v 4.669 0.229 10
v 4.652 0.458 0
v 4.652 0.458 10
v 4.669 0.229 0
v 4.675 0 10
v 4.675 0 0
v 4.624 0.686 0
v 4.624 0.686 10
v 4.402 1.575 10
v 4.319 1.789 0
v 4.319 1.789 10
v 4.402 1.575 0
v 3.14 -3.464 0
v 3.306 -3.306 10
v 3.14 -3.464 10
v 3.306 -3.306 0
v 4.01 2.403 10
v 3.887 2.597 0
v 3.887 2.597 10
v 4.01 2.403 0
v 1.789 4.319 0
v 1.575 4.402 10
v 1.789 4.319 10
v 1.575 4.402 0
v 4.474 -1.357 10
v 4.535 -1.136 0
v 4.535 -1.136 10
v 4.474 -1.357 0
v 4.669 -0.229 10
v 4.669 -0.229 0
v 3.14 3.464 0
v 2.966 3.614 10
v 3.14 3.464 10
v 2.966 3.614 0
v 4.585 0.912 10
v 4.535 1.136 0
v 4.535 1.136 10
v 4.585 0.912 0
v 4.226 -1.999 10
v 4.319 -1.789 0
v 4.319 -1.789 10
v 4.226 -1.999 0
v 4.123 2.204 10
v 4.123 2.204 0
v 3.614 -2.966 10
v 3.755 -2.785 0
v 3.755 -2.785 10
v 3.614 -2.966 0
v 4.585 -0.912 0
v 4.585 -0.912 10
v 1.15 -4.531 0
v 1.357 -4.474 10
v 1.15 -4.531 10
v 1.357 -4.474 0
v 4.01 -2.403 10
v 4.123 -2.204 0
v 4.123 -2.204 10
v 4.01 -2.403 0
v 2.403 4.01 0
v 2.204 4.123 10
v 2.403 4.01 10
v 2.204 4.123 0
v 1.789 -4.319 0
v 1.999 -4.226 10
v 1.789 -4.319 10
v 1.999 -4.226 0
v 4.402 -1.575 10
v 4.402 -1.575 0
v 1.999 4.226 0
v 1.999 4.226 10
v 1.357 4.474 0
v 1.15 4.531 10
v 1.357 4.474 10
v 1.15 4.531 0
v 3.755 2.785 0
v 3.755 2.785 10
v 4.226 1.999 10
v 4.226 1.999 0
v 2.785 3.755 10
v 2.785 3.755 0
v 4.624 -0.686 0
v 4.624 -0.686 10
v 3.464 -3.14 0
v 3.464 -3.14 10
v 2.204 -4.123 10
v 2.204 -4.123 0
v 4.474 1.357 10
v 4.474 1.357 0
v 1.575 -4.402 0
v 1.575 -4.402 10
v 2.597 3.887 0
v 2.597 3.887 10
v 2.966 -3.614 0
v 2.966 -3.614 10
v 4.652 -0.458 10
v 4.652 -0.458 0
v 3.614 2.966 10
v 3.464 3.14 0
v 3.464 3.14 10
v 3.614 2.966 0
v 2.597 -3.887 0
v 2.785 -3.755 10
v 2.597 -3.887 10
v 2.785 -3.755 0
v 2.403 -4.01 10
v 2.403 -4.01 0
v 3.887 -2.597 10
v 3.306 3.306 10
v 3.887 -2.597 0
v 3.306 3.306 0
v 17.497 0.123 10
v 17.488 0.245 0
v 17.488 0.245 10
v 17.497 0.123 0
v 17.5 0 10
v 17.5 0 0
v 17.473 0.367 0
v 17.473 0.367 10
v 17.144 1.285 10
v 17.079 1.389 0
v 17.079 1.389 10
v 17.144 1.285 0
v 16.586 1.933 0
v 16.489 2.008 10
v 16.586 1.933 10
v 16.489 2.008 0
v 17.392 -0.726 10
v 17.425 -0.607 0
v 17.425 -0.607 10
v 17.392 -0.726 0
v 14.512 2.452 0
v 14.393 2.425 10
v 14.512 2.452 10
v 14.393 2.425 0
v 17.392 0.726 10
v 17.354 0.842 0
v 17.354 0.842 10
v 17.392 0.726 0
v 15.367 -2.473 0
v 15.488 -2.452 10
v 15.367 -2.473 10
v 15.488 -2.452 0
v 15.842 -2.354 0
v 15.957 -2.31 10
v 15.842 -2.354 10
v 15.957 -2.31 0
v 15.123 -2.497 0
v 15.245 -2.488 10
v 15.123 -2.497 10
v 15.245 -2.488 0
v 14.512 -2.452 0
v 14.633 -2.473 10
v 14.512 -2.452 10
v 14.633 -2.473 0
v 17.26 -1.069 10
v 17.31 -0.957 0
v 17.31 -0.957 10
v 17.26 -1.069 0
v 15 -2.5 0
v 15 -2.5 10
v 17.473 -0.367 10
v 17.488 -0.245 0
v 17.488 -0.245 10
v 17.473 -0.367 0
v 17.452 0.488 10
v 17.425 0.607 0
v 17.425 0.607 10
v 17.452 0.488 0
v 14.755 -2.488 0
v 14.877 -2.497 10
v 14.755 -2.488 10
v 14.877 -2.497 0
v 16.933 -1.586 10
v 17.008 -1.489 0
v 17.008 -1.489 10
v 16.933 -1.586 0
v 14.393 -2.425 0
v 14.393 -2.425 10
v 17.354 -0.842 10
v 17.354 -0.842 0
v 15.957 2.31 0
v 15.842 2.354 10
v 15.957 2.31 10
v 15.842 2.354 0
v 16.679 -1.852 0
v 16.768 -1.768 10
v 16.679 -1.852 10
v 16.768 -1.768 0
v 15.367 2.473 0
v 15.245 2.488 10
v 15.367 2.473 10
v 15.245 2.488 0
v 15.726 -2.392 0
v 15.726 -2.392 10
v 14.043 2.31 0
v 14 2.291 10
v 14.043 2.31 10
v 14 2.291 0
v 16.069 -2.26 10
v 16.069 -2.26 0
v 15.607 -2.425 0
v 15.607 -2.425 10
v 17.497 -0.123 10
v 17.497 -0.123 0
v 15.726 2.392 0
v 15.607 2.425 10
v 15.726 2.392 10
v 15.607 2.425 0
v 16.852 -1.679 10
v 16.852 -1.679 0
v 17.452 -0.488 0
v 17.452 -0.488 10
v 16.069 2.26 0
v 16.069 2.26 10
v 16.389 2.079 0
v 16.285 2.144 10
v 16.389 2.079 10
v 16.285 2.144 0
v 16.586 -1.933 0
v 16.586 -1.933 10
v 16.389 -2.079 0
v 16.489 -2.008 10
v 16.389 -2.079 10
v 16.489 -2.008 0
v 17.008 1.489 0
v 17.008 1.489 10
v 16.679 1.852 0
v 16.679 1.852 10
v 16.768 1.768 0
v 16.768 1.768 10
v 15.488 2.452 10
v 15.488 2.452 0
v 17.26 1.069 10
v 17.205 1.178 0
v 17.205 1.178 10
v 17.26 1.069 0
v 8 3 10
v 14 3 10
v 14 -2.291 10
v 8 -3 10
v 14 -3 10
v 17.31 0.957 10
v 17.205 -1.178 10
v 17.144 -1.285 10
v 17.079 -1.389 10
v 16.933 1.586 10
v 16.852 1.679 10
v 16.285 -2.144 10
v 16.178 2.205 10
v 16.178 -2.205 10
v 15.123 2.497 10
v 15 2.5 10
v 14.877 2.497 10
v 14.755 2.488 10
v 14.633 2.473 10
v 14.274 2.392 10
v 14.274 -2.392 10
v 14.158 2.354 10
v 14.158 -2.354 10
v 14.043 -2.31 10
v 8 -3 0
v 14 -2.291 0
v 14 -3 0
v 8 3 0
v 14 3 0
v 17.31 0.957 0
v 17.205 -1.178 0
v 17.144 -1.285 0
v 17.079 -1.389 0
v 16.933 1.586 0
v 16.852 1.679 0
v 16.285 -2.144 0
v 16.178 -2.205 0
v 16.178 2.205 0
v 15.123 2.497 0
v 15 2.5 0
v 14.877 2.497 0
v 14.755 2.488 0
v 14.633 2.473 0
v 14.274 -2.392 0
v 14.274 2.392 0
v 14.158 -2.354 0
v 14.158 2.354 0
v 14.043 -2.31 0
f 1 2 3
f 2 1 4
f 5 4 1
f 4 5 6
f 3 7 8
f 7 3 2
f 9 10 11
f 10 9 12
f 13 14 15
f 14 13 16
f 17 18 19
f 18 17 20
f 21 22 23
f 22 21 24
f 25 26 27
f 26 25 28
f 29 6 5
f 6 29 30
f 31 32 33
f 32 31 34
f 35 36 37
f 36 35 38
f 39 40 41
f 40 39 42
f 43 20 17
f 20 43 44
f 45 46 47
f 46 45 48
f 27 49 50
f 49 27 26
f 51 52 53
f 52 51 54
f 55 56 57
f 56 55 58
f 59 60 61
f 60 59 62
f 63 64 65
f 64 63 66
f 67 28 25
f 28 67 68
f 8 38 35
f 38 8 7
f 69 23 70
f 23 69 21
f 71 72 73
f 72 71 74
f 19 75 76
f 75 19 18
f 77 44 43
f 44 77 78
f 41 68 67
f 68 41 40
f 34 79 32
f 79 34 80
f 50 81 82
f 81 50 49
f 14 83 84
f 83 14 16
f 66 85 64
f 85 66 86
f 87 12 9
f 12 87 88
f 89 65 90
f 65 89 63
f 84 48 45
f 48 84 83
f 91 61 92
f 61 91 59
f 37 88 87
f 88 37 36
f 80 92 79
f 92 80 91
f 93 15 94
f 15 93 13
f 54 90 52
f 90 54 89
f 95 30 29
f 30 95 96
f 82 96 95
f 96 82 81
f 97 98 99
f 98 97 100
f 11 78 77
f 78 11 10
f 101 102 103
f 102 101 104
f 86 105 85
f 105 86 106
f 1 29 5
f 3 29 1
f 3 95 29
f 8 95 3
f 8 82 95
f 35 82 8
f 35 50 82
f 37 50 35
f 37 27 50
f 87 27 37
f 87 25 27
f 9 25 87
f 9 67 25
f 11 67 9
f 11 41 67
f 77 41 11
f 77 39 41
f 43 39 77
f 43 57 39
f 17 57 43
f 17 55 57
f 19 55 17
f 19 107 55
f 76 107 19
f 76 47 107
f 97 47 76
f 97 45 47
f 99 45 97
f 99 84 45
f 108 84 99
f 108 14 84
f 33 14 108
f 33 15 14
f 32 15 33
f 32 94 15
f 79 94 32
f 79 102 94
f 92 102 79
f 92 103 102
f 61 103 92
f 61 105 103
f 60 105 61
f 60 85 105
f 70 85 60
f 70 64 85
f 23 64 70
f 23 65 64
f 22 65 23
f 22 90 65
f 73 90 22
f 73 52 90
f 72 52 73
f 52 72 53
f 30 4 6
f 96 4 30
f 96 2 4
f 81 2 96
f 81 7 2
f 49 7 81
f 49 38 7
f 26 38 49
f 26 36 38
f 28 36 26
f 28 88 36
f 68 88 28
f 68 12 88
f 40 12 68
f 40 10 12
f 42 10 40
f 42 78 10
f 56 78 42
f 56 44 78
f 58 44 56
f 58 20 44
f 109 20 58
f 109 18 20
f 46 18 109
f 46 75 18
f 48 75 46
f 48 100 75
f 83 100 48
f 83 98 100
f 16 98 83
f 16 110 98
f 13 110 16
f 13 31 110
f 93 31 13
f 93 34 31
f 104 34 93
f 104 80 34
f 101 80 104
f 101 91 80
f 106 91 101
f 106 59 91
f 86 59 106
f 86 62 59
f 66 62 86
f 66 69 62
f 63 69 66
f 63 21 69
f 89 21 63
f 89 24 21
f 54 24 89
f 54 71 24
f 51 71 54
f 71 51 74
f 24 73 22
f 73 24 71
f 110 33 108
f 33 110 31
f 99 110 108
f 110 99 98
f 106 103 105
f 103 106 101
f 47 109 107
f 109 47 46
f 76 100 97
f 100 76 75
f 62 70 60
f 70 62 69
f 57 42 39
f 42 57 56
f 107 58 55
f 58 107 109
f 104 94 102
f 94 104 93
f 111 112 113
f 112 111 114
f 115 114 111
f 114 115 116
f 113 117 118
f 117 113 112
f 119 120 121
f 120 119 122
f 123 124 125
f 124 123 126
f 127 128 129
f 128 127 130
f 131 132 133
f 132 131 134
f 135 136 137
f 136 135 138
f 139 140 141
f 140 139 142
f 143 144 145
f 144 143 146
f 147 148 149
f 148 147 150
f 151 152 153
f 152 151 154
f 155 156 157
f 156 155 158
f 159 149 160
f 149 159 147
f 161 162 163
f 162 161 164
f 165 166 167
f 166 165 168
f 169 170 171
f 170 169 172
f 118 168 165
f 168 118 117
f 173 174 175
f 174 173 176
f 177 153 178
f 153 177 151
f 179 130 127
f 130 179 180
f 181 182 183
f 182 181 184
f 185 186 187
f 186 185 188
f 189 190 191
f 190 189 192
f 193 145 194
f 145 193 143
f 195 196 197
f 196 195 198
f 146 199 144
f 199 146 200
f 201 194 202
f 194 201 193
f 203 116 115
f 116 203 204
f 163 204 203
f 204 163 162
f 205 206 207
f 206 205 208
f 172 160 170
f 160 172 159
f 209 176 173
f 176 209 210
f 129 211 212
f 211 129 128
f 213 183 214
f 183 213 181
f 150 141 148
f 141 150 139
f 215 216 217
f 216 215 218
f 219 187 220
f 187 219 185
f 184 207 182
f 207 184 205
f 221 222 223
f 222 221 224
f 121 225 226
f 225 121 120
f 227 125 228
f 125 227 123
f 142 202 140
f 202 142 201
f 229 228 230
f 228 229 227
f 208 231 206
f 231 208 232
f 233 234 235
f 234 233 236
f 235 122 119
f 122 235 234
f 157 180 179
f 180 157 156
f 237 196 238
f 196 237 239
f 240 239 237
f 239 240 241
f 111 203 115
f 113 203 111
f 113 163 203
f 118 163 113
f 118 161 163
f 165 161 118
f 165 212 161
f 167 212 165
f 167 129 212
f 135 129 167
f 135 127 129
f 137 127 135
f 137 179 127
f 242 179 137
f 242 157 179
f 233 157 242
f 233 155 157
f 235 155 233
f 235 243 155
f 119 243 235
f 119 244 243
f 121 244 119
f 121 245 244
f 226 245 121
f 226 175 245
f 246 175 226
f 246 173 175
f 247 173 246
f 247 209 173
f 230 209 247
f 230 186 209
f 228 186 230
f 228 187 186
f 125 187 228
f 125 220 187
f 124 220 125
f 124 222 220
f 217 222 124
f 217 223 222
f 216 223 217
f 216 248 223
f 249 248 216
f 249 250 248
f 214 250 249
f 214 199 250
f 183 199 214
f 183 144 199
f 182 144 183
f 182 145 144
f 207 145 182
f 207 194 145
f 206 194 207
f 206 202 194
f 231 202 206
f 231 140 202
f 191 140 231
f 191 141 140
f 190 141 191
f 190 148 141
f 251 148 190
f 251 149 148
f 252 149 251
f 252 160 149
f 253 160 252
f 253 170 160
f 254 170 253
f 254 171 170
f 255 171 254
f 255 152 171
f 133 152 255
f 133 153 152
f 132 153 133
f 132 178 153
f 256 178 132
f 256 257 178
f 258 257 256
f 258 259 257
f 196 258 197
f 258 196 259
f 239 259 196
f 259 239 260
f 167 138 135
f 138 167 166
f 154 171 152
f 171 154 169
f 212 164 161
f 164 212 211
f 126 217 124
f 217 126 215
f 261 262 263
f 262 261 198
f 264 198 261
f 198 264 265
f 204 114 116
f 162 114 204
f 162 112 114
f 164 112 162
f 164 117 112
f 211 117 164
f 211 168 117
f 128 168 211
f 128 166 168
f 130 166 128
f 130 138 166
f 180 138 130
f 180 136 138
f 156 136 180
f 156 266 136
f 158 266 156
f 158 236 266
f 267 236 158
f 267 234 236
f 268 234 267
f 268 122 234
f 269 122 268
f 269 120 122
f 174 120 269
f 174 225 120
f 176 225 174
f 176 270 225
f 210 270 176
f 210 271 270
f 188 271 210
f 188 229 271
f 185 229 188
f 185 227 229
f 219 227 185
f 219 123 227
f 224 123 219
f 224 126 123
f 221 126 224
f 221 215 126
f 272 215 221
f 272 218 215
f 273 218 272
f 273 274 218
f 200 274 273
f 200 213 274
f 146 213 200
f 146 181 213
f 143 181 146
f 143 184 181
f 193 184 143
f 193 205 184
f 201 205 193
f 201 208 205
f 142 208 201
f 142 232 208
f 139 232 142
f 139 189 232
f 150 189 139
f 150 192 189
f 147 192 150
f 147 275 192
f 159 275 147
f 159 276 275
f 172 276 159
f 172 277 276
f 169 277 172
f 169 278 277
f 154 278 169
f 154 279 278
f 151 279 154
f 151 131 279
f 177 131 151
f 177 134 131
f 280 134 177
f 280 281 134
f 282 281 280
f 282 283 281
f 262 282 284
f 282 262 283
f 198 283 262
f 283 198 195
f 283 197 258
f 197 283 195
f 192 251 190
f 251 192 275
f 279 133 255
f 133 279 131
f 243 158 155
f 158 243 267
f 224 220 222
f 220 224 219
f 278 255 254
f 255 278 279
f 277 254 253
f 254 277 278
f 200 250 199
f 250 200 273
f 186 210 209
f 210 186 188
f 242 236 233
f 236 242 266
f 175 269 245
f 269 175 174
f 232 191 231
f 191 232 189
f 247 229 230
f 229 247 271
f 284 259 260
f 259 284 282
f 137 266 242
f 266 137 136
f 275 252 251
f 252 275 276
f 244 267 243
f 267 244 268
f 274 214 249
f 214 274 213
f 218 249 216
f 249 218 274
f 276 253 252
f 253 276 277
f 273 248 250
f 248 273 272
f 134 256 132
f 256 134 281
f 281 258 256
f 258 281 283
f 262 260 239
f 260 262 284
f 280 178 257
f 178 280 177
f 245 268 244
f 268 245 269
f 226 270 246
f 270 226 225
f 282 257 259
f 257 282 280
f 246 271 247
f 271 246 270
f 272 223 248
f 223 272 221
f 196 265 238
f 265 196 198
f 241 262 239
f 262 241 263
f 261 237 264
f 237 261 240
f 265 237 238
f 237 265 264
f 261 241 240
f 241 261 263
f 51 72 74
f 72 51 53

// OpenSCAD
// Snap-on clip: holds a piece of tubing next to a 12.7 mm (1/2") lab stand rod
// Printed flat: 2-D profile in XY, extruded 10 mm in +Z.

$fn = 128;

// ---------------- Parameters ----------------
rod_d      = 12.7;              // rod ring inner diameter
rod_wall   = 3;                 // rod ring wall thickness
rod_r      = rod_d / 2;         // rod ring radius (12.7/2)
outer_r    = rod_r + rod_wall;  // rod ring outer radius (18.7)

tub_d      = 6;                 // tubing ring inner diameter
tub_wall   = 2;                 // tubing ring wall thickness
tub_r      = tub_d / 2;         // tubing ring radius (6/2)
outer_tub_r = tub_r + tub_wall; // tubing ring outer radius (8)

bridge_w   = 6;                 // bridge width in X (from x = 8 to x = 12)
bridge_y   = 6;                 // bridge width in Y

clip_h     = 10;                // extrusion height (Z)

eps        = 0.5;               // overshoot for clean cuts

// ---------------- Derived ----------------
rod_open_w = 10;                // opening cut out of -X side (-5 < y < 5)
tub_open_w = 4.5;               // opening cut out of +X side (-2.25 < y < 2.25)

// ---------------- Model ----------------
difference() {
    union() {
        // Rod ring
        cylinder(d = outer_r, r = rod_r, h = clip_h);

        // Tubing ring
        translate([15, 0, 0])
            cylinder(d = outer_tub_r, r = tub_r, h = clip_h);

        // Solid bridge between the rings
        translate([8, -bridge_y / 2, 0])
            cube([bridge_w, bridge_y, clip_h]);
    }

    // Rod opening: remove everything with x < 0 and -5 < y < 5 from the rod ring
    translate([-(outer_r + eps), -5, -eps])
        cube([rod_open_w + 2 * eps, 10, clip_h + 2 * eps]);

    // Tubing opening: remove x > 15 and -2.25 < y < 2.25 from the tubing ring
    translate([15, -tub_open_w / 2, -eps])
        cube([outer_tub_r - 15 + eps, tub_open_w, clip_h + 2 * eps]);
}
